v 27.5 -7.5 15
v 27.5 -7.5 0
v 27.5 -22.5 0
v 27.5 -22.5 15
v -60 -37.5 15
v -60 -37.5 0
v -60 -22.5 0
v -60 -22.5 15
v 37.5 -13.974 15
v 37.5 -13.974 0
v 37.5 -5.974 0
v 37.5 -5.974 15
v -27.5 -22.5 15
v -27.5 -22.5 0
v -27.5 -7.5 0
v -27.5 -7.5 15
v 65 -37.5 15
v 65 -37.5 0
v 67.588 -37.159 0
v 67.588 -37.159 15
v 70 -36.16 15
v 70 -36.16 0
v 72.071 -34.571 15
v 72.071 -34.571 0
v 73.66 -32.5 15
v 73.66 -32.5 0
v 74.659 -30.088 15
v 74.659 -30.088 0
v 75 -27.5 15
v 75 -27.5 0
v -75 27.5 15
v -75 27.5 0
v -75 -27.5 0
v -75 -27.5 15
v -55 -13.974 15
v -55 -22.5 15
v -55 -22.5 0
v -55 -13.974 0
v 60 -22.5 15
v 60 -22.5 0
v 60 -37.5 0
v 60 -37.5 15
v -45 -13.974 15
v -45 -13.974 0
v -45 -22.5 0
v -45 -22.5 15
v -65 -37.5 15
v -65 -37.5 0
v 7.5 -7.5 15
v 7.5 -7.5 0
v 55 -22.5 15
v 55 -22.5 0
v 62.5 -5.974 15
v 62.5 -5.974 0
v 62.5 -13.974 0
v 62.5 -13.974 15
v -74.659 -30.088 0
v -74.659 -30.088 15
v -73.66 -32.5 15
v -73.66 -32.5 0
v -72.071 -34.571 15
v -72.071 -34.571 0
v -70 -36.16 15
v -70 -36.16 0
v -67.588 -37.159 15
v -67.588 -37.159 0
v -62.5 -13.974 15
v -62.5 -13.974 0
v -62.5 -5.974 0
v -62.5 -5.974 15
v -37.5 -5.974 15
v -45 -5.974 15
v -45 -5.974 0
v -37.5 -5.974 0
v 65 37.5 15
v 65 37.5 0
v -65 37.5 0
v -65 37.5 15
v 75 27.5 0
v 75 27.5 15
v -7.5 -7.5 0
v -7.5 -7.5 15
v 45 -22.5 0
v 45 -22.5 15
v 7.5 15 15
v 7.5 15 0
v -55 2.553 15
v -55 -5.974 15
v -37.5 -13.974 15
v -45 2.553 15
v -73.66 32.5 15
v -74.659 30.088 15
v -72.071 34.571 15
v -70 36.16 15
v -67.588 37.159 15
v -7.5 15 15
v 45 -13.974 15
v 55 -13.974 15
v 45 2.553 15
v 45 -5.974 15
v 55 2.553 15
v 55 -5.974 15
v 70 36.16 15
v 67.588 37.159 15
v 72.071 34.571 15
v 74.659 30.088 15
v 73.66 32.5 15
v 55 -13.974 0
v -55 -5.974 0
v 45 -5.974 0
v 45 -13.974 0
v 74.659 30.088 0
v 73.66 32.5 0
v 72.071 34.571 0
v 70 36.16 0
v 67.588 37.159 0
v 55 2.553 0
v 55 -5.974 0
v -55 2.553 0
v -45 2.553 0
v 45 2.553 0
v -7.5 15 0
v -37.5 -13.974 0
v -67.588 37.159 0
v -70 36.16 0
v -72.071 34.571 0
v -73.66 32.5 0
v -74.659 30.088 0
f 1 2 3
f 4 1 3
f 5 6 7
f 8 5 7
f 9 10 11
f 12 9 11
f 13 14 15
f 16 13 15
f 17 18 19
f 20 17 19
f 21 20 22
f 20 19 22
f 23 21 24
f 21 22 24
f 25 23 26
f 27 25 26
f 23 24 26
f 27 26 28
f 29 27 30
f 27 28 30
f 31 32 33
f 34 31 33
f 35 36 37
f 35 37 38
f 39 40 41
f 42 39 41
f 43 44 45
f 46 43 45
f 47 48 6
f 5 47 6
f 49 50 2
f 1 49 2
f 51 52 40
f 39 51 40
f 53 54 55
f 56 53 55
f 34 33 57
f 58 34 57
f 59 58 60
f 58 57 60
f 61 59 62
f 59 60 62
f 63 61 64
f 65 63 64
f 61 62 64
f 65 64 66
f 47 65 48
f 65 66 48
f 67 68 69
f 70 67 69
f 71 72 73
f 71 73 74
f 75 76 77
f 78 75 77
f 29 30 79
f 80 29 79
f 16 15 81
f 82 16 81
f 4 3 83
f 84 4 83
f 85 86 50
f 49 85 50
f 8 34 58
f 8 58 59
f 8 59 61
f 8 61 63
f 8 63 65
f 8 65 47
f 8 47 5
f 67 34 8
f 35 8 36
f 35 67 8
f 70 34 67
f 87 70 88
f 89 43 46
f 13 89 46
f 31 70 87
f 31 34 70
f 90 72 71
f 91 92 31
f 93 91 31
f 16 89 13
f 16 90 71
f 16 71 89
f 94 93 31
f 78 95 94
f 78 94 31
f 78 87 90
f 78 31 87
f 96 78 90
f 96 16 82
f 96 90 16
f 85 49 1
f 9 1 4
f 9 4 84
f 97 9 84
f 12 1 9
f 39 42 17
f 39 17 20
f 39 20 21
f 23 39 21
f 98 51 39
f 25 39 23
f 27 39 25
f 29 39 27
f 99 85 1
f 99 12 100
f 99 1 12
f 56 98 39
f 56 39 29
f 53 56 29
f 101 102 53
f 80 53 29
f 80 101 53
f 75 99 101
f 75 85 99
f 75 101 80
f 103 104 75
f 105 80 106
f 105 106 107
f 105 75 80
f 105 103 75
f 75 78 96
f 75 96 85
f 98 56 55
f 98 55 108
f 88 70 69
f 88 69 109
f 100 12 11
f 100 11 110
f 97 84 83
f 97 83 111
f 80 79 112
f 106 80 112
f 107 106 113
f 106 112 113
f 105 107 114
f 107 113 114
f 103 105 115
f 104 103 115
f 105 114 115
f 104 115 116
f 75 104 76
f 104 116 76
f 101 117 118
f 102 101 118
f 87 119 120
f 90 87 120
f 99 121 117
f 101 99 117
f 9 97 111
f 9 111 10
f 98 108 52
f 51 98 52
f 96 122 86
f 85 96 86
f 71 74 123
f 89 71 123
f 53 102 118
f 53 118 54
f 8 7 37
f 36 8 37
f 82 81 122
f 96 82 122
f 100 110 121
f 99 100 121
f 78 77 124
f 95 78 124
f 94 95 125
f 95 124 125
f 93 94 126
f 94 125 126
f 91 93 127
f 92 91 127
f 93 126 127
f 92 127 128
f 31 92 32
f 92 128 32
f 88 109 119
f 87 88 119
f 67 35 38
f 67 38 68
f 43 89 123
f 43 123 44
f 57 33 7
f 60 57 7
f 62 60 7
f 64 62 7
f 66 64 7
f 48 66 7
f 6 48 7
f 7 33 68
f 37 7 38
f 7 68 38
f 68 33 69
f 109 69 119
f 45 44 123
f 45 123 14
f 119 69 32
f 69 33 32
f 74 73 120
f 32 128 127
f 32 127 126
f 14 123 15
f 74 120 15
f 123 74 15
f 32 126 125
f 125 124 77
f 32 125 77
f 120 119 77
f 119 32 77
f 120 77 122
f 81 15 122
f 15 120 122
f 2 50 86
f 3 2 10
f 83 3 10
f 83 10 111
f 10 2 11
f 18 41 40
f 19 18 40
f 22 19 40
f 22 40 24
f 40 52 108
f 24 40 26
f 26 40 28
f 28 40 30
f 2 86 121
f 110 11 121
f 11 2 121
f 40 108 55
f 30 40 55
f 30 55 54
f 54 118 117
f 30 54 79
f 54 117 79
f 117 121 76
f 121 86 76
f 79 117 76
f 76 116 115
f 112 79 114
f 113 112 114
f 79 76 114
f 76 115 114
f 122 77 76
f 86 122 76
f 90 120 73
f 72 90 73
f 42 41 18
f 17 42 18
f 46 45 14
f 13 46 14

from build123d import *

# Parameters (mm, degrees)
BOSS_EXTRU_1_DEPTH = 15


with BuildPart() as part:
    # Esquisse1 → Boss.-Extru.1 (new body)
    with BuildSketch(Plane.XY):
        with BuildLine():
            Line((65, 37.5), (-65, 37.5))
            ThreePointArc((-65, 37.5), (-72.071067812, 34.571067812), (-75, 27.5))
            Line((-75, 27.5), (-75, -27.5))
            ThreePointArc((-75, -27.5), (-72.071067812, -34.571067812), (-65, -37.5))
            Line((-65, -37.5), (-60, -37.5))
            Line((-60, -37.5), (-60, -22.5))
            Line((-60, -22.5), (-55, -22.5))
            Line((-55, -22.5), (-55, -13.973661668))
            Line((-55, -13.973661668), (-62.5, -13.973661668))
            Line((-62.5, -13.973661668), (-62.5, -5.973661668))
            Line((-62.5, -5.973661668), (-55, -5.973661668))
            Line((-55, -5.973661668), (-55, 2.552676663))
            Line((-55, 2.552676663), (-45, 2.552676663))
            Line((-45, 2.552676663), (-45, -5.973661668))
            Line((-45, -5.973661668), (-37.5, -5.973661668))
            Line((-37.5, -5.973661668), (-37.5, -13.973661668))
            Line((-37.5, -13.973661668), (-45, -13.973661668))
            Line((-45, -13.973661668), (-45, -22.5))
            Line((-45, -22.5), (-27.5, -22.5))
            Line((-27.5, -22.5), (-27.5, -7.5))
            Line((-27.5, -7.5), (-7.5, -7.5))
            Line((-7.5, -7.5), (-7.5, 15))
            Line((-7.5, 15), (7.5, 15))
            Line((7.5, 15), (7.5, -7.5))
            Line((7.5, -7.5), (27.5, -7.5))
            Line((27.5, -7.5), (27.5, -22.5))
            Line((27.5, -22.5), (45, -22.5))
            Line((45, -22.5), (45, -13.973661668))
            Line((45, -13.973661668), (37.5, -13.973661668))
            Line((37.5, -13.973661668), (37.5, -5.973661668))
            Line((37.5, -5.973661668), (45, -5.973661668))
            Line((45, -5.973661668), (45, 2.552676663))
            Line((45, 2.552676663), (55, 2.552676663))
            Line((55, 2.552676663), (55, -5.973661668))
            Line((55, -5.973661668), (62.5, -5.973661668))
            Line((62.5, -5.973661668), (62.5, -13.973661668))
            Line((62.5, -13.973661668), (55, -13.973661668))
            Line((55, -13.973661668), (55, -22.5))
            Line((55, -22.5), (60, -22.5))
            Line((60, -22.5), (60, -37.5))
            Line((60, -37.5), (65, -37.5))
            ThreePointArc((65, -37.5), (72.071067812, -34.571067812), (75, -27.5))
            Line((75, -27.5), (75, 27.5))
            ThreePointArc((75, 27.5), (72.071067812, 34.571067812), (65, 37.5))
        make_face()
    extrude(amount=BOSS_EXTRU_1_DEPTH)


solid = part.part
